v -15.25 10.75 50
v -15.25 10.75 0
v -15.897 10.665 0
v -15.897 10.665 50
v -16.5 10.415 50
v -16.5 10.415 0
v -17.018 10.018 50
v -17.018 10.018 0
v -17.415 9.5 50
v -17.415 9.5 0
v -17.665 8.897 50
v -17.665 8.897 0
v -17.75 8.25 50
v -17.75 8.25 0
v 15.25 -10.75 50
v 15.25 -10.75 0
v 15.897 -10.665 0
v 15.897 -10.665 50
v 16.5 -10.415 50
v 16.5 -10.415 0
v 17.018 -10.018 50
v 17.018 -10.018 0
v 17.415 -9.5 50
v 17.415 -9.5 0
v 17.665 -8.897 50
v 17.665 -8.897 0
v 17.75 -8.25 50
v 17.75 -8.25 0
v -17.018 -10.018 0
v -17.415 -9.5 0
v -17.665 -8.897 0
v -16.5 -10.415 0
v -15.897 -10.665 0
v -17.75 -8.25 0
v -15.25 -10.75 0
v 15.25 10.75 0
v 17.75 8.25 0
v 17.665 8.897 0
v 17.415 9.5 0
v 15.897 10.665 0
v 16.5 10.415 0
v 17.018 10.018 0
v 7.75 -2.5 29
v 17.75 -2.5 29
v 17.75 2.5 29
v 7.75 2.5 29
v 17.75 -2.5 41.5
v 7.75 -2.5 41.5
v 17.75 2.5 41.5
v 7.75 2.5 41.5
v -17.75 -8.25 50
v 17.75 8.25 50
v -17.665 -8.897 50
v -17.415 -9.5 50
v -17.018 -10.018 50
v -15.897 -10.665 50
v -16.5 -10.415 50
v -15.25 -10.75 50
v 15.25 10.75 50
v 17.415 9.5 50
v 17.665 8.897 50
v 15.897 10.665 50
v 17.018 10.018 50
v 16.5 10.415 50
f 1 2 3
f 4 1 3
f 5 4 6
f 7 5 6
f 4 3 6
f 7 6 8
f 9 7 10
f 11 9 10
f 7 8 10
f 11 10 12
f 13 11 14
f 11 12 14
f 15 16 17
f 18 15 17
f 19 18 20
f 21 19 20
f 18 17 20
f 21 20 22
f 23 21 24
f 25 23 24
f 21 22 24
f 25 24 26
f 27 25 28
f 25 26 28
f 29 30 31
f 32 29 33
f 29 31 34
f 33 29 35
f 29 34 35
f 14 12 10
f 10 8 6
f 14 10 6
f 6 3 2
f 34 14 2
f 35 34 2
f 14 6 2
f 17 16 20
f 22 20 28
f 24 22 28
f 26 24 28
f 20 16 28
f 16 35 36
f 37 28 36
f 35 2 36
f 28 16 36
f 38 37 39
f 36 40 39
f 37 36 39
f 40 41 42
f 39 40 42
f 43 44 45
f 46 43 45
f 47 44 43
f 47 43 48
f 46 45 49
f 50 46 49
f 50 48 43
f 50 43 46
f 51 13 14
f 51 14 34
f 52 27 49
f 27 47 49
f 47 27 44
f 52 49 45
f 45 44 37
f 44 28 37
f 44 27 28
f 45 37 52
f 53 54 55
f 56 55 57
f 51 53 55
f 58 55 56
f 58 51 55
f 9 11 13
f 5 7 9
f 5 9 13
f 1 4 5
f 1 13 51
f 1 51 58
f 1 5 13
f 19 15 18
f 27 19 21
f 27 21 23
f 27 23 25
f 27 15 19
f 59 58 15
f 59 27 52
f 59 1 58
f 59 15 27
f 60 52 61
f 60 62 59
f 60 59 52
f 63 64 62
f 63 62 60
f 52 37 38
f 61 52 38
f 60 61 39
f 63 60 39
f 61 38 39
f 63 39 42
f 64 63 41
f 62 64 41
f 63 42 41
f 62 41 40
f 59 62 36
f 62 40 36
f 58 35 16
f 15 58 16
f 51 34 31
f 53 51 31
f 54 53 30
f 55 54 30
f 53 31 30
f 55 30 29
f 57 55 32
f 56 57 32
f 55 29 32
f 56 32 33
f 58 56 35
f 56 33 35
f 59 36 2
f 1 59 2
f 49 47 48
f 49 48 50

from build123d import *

# Parameters (mm, degrees)
F1_DEPTH = 50
F2_W     = 5
F2_H     = 12.5
F3_DEPTH = 10


with BuildPart() as f1:
    # F0 (on Top) → F1 (new body)
    with BuildSketch(Plane.XY):
        with BuildLine():
            Line((-15.25, -10.75), (15.25, -10.75))
            ThreePointArc((15.25, -10.75), (17.017767, -10.017767), (17.75, -8.25))
            Line((17.75, -8.25), (17.75, 8.25))
            ThreePointArc((17.75, 8.25), (17.017767, 10.017767), (15.25, 10.75))
            Line((15.25, 10.75), (-15.25, 10.75))
            ThreePointArc((-15.25, 10.75), (-17.017767, 10.017767), (-17.75, 8.25))
            Line((-17.75, 8.25), (-17.75, -8.25))
            ThreePointArc((-17.75, -8.25), (-17.017767, -10.017767), (-15.25, -10.75))
        make_face()
    extrude(amount=F1_DEPTH)

    # F2 (on face) → F3 (cut)
    with BuildSketch(Plane.YZ.offset(17.75)):
        with Locations((0, 35.25)):
            Rectangle(F2_W, F2_H)
    extrude(amount=-F3_DEPTH, mode=Mode.SUBTRACT)


solid = f1.part
